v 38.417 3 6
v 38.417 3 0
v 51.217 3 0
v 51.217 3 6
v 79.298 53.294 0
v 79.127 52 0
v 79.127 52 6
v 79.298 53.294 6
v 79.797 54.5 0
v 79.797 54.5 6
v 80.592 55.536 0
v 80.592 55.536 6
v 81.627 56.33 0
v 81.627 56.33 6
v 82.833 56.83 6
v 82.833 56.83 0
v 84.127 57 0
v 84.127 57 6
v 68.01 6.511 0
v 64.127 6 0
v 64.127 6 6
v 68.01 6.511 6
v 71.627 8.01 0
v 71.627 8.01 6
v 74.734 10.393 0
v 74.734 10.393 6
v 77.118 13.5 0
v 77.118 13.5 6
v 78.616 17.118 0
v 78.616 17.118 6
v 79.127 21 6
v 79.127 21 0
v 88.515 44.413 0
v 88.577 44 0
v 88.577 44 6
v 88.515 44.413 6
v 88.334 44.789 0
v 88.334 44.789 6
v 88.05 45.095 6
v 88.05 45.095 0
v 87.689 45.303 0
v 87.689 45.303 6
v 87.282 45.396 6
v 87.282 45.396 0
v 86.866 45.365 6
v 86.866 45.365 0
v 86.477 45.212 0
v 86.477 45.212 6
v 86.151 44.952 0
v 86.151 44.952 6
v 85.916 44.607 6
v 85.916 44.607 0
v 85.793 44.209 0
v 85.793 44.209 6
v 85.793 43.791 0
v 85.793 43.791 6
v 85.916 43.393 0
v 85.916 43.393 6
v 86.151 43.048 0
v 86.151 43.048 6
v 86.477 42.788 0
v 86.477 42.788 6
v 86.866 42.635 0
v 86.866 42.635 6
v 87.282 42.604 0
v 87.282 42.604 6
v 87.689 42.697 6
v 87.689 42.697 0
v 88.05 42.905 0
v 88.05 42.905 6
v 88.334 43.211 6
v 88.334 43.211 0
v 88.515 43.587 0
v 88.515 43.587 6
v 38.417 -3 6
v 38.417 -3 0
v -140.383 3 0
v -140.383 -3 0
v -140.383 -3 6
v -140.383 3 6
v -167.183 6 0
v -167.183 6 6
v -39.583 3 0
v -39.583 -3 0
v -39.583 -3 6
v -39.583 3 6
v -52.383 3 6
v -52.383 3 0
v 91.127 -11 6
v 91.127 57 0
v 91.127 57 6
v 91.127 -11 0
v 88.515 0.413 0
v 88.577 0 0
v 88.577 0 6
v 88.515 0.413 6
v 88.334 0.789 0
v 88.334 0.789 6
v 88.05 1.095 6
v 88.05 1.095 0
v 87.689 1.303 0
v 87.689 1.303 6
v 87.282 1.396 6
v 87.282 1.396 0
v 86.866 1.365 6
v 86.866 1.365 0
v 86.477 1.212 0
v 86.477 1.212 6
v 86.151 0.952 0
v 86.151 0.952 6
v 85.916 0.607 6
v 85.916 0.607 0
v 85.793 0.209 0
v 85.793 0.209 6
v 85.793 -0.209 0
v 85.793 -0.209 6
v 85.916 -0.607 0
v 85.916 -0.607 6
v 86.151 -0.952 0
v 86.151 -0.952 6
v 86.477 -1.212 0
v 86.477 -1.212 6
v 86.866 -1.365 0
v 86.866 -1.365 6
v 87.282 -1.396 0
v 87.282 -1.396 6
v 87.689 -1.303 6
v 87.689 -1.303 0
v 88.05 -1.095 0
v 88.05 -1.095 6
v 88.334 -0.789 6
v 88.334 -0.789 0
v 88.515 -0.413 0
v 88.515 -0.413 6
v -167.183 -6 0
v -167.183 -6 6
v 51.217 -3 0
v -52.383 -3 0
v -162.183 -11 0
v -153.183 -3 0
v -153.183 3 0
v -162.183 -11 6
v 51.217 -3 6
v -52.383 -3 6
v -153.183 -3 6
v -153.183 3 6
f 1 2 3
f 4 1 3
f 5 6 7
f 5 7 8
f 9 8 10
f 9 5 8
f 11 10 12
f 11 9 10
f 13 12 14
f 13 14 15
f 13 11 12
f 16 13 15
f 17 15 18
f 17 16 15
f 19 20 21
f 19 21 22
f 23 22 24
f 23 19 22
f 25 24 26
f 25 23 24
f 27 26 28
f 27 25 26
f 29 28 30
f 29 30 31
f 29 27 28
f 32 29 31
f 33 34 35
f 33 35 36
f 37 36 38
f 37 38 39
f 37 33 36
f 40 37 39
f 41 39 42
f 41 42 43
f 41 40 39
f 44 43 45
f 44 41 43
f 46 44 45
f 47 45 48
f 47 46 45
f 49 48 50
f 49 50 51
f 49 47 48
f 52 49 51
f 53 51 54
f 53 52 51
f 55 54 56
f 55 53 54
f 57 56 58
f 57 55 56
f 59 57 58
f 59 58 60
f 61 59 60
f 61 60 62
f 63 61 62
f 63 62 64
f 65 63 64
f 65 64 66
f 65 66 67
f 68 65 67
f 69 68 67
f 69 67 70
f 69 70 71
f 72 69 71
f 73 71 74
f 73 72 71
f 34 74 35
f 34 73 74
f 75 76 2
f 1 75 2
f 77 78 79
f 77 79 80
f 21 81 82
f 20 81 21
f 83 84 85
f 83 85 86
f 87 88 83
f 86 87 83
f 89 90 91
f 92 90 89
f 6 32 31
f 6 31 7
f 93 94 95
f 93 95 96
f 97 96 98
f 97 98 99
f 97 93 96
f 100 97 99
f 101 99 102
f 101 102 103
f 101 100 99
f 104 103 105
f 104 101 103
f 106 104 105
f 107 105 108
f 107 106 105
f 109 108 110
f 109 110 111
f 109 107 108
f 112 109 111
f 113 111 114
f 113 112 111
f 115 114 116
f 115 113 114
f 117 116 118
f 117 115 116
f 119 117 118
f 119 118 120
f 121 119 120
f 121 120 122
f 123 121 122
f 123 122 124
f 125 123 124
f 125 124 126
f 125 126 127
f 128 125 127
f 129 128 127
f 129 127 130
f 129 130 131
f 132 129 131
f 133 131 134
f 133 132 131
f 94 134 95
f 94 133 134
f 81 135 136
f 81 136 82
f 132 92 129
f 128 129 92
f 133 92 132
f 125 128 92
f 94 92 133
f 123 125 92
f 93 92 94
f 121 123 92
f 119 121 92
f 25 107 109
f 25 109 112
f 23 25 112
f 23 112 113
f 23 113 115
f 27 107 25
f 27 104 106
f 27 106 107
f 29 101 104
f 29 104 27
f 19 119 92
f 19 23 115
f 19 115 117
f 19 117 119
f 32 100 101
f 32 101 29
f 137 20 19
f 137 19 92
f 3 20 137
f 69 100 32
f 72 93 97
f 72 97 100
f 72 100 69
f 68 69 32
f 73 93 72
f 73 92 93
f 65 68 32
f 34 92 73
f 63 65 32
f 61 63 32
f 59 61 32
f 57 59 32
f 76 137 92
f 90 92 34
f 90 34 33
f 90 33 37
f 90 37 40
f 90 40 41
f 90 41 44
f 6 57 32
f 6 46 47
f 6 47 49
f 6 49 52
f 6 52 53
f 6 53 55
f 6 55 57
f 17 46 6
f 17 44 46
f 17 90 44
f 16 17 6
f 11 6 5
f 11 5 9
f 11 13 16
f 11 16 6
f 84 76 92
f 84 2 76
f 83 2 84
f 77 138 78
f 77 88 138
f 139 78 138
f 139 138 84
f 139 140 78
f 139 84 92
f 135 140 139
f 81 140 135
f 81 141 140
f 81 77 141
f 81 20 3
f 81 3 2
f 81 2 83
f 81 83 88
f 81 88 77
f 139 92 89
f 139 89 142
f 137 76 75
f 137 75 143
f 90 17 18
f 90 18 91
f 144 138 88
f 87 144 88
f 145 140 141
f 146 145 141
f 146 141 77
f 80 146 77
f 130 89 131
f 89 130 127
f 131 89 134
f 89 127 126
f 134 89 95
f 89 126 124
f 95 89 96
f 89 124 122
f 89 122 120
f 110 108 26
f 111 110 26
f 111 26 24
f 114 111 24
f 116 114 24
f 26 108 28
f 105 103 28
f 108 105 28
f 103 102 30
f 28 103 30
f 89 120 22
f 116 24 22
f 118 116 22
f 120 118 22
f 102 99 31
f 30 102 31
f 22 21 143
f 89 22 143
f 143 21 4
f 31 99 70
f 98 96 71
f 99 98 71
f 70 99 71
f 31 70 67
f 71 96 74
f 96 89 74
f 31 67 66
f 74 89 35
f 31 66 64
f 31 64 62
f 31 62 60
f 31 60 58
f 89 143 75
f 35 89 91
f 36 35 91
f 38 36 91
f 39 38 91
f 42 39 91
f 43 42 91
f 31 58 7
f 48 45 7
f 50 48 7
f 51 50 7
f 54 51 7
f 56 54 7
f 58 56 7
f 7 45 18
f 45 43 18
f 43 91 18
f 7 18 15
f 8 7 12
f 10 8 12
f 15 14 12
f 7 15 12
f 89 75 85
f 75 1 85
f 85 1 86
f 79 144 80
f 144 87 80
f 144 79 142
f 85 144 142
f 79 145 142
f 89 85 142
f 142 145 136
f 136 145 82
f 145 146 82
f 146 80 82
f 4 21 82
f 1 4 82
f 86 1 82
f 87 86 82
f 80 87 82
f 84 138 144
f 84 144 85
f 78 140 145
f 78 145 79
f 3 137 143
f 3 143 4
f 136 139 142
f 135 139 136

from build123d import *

# Parameters (mm, degrees)
SKETCH_1_R      = 1.4
SKETCH_1_W      = 12.8
SKETCH_1_H      = 6
EXTRUDE_1_DEPTH = 6


with BuildPart() as part:
    # Эскиз1 → Бобышка-Вытянуть1 (new body)
    with BuildSketch(Plane.XY):
        with BuildLine():
            Line((-167.182566644, 6), (64.127433356, 6))
            ThreePointArc((64.127433356, 6), (74.734035074, 10.393398282), (79.127433356, 21))
            Line((79.127433356, 21), (79.127433356, 44))
            Line((79.127433356, 44), (79.127433356, 52))
            ThreePointArc((79.127433356, 52), (80.59189945, 55.535533906), (84.127433356, 57))
            Line((84.127433356, 57), (91.127433356, 57))
            Line((91.127433356, 57), (91.127433356, 49))
            Line((91.127433356, 49), (91.127433356, 6))
            Line((91.127433356, 6), (91.127433356, -11))
            Line((91.127433356, -11), (-162.182566644, -11))
            Line((-162.182566644, -11), (-167.182566644, -6))
            Line((-167.182566644, -6), (-167.182566644, 6))
        make_face()
        with Locations((87.177433356, 0)):
            Circle(SKETCH_1_R, mode=Mode.SUBTRACT)
        with Locations((87.177433356, 44)):
            Circle(SKETCH_1_R, mode=Mode.SUBTRACT)
        with Locations((44.817433356, 0)):
            Rectangle(SKETCH_1_W, SKETCH_1_H, mode=Mode.SUBTRACT)
        with Locations((-45.982566644, 0)):
            Rectangle(SKETCH_1_W, SKETCH_1_H, mode=Mode.SUBTRACT)
        with Locations((-146.782566644, 0)):
            Rectangle(SKETCH_1_W, SKETCH_1_H, mode=Mode.SUBTRACT)
    extrude(amount=EXTRUDE_1_DEPTH)


solid = part.part
